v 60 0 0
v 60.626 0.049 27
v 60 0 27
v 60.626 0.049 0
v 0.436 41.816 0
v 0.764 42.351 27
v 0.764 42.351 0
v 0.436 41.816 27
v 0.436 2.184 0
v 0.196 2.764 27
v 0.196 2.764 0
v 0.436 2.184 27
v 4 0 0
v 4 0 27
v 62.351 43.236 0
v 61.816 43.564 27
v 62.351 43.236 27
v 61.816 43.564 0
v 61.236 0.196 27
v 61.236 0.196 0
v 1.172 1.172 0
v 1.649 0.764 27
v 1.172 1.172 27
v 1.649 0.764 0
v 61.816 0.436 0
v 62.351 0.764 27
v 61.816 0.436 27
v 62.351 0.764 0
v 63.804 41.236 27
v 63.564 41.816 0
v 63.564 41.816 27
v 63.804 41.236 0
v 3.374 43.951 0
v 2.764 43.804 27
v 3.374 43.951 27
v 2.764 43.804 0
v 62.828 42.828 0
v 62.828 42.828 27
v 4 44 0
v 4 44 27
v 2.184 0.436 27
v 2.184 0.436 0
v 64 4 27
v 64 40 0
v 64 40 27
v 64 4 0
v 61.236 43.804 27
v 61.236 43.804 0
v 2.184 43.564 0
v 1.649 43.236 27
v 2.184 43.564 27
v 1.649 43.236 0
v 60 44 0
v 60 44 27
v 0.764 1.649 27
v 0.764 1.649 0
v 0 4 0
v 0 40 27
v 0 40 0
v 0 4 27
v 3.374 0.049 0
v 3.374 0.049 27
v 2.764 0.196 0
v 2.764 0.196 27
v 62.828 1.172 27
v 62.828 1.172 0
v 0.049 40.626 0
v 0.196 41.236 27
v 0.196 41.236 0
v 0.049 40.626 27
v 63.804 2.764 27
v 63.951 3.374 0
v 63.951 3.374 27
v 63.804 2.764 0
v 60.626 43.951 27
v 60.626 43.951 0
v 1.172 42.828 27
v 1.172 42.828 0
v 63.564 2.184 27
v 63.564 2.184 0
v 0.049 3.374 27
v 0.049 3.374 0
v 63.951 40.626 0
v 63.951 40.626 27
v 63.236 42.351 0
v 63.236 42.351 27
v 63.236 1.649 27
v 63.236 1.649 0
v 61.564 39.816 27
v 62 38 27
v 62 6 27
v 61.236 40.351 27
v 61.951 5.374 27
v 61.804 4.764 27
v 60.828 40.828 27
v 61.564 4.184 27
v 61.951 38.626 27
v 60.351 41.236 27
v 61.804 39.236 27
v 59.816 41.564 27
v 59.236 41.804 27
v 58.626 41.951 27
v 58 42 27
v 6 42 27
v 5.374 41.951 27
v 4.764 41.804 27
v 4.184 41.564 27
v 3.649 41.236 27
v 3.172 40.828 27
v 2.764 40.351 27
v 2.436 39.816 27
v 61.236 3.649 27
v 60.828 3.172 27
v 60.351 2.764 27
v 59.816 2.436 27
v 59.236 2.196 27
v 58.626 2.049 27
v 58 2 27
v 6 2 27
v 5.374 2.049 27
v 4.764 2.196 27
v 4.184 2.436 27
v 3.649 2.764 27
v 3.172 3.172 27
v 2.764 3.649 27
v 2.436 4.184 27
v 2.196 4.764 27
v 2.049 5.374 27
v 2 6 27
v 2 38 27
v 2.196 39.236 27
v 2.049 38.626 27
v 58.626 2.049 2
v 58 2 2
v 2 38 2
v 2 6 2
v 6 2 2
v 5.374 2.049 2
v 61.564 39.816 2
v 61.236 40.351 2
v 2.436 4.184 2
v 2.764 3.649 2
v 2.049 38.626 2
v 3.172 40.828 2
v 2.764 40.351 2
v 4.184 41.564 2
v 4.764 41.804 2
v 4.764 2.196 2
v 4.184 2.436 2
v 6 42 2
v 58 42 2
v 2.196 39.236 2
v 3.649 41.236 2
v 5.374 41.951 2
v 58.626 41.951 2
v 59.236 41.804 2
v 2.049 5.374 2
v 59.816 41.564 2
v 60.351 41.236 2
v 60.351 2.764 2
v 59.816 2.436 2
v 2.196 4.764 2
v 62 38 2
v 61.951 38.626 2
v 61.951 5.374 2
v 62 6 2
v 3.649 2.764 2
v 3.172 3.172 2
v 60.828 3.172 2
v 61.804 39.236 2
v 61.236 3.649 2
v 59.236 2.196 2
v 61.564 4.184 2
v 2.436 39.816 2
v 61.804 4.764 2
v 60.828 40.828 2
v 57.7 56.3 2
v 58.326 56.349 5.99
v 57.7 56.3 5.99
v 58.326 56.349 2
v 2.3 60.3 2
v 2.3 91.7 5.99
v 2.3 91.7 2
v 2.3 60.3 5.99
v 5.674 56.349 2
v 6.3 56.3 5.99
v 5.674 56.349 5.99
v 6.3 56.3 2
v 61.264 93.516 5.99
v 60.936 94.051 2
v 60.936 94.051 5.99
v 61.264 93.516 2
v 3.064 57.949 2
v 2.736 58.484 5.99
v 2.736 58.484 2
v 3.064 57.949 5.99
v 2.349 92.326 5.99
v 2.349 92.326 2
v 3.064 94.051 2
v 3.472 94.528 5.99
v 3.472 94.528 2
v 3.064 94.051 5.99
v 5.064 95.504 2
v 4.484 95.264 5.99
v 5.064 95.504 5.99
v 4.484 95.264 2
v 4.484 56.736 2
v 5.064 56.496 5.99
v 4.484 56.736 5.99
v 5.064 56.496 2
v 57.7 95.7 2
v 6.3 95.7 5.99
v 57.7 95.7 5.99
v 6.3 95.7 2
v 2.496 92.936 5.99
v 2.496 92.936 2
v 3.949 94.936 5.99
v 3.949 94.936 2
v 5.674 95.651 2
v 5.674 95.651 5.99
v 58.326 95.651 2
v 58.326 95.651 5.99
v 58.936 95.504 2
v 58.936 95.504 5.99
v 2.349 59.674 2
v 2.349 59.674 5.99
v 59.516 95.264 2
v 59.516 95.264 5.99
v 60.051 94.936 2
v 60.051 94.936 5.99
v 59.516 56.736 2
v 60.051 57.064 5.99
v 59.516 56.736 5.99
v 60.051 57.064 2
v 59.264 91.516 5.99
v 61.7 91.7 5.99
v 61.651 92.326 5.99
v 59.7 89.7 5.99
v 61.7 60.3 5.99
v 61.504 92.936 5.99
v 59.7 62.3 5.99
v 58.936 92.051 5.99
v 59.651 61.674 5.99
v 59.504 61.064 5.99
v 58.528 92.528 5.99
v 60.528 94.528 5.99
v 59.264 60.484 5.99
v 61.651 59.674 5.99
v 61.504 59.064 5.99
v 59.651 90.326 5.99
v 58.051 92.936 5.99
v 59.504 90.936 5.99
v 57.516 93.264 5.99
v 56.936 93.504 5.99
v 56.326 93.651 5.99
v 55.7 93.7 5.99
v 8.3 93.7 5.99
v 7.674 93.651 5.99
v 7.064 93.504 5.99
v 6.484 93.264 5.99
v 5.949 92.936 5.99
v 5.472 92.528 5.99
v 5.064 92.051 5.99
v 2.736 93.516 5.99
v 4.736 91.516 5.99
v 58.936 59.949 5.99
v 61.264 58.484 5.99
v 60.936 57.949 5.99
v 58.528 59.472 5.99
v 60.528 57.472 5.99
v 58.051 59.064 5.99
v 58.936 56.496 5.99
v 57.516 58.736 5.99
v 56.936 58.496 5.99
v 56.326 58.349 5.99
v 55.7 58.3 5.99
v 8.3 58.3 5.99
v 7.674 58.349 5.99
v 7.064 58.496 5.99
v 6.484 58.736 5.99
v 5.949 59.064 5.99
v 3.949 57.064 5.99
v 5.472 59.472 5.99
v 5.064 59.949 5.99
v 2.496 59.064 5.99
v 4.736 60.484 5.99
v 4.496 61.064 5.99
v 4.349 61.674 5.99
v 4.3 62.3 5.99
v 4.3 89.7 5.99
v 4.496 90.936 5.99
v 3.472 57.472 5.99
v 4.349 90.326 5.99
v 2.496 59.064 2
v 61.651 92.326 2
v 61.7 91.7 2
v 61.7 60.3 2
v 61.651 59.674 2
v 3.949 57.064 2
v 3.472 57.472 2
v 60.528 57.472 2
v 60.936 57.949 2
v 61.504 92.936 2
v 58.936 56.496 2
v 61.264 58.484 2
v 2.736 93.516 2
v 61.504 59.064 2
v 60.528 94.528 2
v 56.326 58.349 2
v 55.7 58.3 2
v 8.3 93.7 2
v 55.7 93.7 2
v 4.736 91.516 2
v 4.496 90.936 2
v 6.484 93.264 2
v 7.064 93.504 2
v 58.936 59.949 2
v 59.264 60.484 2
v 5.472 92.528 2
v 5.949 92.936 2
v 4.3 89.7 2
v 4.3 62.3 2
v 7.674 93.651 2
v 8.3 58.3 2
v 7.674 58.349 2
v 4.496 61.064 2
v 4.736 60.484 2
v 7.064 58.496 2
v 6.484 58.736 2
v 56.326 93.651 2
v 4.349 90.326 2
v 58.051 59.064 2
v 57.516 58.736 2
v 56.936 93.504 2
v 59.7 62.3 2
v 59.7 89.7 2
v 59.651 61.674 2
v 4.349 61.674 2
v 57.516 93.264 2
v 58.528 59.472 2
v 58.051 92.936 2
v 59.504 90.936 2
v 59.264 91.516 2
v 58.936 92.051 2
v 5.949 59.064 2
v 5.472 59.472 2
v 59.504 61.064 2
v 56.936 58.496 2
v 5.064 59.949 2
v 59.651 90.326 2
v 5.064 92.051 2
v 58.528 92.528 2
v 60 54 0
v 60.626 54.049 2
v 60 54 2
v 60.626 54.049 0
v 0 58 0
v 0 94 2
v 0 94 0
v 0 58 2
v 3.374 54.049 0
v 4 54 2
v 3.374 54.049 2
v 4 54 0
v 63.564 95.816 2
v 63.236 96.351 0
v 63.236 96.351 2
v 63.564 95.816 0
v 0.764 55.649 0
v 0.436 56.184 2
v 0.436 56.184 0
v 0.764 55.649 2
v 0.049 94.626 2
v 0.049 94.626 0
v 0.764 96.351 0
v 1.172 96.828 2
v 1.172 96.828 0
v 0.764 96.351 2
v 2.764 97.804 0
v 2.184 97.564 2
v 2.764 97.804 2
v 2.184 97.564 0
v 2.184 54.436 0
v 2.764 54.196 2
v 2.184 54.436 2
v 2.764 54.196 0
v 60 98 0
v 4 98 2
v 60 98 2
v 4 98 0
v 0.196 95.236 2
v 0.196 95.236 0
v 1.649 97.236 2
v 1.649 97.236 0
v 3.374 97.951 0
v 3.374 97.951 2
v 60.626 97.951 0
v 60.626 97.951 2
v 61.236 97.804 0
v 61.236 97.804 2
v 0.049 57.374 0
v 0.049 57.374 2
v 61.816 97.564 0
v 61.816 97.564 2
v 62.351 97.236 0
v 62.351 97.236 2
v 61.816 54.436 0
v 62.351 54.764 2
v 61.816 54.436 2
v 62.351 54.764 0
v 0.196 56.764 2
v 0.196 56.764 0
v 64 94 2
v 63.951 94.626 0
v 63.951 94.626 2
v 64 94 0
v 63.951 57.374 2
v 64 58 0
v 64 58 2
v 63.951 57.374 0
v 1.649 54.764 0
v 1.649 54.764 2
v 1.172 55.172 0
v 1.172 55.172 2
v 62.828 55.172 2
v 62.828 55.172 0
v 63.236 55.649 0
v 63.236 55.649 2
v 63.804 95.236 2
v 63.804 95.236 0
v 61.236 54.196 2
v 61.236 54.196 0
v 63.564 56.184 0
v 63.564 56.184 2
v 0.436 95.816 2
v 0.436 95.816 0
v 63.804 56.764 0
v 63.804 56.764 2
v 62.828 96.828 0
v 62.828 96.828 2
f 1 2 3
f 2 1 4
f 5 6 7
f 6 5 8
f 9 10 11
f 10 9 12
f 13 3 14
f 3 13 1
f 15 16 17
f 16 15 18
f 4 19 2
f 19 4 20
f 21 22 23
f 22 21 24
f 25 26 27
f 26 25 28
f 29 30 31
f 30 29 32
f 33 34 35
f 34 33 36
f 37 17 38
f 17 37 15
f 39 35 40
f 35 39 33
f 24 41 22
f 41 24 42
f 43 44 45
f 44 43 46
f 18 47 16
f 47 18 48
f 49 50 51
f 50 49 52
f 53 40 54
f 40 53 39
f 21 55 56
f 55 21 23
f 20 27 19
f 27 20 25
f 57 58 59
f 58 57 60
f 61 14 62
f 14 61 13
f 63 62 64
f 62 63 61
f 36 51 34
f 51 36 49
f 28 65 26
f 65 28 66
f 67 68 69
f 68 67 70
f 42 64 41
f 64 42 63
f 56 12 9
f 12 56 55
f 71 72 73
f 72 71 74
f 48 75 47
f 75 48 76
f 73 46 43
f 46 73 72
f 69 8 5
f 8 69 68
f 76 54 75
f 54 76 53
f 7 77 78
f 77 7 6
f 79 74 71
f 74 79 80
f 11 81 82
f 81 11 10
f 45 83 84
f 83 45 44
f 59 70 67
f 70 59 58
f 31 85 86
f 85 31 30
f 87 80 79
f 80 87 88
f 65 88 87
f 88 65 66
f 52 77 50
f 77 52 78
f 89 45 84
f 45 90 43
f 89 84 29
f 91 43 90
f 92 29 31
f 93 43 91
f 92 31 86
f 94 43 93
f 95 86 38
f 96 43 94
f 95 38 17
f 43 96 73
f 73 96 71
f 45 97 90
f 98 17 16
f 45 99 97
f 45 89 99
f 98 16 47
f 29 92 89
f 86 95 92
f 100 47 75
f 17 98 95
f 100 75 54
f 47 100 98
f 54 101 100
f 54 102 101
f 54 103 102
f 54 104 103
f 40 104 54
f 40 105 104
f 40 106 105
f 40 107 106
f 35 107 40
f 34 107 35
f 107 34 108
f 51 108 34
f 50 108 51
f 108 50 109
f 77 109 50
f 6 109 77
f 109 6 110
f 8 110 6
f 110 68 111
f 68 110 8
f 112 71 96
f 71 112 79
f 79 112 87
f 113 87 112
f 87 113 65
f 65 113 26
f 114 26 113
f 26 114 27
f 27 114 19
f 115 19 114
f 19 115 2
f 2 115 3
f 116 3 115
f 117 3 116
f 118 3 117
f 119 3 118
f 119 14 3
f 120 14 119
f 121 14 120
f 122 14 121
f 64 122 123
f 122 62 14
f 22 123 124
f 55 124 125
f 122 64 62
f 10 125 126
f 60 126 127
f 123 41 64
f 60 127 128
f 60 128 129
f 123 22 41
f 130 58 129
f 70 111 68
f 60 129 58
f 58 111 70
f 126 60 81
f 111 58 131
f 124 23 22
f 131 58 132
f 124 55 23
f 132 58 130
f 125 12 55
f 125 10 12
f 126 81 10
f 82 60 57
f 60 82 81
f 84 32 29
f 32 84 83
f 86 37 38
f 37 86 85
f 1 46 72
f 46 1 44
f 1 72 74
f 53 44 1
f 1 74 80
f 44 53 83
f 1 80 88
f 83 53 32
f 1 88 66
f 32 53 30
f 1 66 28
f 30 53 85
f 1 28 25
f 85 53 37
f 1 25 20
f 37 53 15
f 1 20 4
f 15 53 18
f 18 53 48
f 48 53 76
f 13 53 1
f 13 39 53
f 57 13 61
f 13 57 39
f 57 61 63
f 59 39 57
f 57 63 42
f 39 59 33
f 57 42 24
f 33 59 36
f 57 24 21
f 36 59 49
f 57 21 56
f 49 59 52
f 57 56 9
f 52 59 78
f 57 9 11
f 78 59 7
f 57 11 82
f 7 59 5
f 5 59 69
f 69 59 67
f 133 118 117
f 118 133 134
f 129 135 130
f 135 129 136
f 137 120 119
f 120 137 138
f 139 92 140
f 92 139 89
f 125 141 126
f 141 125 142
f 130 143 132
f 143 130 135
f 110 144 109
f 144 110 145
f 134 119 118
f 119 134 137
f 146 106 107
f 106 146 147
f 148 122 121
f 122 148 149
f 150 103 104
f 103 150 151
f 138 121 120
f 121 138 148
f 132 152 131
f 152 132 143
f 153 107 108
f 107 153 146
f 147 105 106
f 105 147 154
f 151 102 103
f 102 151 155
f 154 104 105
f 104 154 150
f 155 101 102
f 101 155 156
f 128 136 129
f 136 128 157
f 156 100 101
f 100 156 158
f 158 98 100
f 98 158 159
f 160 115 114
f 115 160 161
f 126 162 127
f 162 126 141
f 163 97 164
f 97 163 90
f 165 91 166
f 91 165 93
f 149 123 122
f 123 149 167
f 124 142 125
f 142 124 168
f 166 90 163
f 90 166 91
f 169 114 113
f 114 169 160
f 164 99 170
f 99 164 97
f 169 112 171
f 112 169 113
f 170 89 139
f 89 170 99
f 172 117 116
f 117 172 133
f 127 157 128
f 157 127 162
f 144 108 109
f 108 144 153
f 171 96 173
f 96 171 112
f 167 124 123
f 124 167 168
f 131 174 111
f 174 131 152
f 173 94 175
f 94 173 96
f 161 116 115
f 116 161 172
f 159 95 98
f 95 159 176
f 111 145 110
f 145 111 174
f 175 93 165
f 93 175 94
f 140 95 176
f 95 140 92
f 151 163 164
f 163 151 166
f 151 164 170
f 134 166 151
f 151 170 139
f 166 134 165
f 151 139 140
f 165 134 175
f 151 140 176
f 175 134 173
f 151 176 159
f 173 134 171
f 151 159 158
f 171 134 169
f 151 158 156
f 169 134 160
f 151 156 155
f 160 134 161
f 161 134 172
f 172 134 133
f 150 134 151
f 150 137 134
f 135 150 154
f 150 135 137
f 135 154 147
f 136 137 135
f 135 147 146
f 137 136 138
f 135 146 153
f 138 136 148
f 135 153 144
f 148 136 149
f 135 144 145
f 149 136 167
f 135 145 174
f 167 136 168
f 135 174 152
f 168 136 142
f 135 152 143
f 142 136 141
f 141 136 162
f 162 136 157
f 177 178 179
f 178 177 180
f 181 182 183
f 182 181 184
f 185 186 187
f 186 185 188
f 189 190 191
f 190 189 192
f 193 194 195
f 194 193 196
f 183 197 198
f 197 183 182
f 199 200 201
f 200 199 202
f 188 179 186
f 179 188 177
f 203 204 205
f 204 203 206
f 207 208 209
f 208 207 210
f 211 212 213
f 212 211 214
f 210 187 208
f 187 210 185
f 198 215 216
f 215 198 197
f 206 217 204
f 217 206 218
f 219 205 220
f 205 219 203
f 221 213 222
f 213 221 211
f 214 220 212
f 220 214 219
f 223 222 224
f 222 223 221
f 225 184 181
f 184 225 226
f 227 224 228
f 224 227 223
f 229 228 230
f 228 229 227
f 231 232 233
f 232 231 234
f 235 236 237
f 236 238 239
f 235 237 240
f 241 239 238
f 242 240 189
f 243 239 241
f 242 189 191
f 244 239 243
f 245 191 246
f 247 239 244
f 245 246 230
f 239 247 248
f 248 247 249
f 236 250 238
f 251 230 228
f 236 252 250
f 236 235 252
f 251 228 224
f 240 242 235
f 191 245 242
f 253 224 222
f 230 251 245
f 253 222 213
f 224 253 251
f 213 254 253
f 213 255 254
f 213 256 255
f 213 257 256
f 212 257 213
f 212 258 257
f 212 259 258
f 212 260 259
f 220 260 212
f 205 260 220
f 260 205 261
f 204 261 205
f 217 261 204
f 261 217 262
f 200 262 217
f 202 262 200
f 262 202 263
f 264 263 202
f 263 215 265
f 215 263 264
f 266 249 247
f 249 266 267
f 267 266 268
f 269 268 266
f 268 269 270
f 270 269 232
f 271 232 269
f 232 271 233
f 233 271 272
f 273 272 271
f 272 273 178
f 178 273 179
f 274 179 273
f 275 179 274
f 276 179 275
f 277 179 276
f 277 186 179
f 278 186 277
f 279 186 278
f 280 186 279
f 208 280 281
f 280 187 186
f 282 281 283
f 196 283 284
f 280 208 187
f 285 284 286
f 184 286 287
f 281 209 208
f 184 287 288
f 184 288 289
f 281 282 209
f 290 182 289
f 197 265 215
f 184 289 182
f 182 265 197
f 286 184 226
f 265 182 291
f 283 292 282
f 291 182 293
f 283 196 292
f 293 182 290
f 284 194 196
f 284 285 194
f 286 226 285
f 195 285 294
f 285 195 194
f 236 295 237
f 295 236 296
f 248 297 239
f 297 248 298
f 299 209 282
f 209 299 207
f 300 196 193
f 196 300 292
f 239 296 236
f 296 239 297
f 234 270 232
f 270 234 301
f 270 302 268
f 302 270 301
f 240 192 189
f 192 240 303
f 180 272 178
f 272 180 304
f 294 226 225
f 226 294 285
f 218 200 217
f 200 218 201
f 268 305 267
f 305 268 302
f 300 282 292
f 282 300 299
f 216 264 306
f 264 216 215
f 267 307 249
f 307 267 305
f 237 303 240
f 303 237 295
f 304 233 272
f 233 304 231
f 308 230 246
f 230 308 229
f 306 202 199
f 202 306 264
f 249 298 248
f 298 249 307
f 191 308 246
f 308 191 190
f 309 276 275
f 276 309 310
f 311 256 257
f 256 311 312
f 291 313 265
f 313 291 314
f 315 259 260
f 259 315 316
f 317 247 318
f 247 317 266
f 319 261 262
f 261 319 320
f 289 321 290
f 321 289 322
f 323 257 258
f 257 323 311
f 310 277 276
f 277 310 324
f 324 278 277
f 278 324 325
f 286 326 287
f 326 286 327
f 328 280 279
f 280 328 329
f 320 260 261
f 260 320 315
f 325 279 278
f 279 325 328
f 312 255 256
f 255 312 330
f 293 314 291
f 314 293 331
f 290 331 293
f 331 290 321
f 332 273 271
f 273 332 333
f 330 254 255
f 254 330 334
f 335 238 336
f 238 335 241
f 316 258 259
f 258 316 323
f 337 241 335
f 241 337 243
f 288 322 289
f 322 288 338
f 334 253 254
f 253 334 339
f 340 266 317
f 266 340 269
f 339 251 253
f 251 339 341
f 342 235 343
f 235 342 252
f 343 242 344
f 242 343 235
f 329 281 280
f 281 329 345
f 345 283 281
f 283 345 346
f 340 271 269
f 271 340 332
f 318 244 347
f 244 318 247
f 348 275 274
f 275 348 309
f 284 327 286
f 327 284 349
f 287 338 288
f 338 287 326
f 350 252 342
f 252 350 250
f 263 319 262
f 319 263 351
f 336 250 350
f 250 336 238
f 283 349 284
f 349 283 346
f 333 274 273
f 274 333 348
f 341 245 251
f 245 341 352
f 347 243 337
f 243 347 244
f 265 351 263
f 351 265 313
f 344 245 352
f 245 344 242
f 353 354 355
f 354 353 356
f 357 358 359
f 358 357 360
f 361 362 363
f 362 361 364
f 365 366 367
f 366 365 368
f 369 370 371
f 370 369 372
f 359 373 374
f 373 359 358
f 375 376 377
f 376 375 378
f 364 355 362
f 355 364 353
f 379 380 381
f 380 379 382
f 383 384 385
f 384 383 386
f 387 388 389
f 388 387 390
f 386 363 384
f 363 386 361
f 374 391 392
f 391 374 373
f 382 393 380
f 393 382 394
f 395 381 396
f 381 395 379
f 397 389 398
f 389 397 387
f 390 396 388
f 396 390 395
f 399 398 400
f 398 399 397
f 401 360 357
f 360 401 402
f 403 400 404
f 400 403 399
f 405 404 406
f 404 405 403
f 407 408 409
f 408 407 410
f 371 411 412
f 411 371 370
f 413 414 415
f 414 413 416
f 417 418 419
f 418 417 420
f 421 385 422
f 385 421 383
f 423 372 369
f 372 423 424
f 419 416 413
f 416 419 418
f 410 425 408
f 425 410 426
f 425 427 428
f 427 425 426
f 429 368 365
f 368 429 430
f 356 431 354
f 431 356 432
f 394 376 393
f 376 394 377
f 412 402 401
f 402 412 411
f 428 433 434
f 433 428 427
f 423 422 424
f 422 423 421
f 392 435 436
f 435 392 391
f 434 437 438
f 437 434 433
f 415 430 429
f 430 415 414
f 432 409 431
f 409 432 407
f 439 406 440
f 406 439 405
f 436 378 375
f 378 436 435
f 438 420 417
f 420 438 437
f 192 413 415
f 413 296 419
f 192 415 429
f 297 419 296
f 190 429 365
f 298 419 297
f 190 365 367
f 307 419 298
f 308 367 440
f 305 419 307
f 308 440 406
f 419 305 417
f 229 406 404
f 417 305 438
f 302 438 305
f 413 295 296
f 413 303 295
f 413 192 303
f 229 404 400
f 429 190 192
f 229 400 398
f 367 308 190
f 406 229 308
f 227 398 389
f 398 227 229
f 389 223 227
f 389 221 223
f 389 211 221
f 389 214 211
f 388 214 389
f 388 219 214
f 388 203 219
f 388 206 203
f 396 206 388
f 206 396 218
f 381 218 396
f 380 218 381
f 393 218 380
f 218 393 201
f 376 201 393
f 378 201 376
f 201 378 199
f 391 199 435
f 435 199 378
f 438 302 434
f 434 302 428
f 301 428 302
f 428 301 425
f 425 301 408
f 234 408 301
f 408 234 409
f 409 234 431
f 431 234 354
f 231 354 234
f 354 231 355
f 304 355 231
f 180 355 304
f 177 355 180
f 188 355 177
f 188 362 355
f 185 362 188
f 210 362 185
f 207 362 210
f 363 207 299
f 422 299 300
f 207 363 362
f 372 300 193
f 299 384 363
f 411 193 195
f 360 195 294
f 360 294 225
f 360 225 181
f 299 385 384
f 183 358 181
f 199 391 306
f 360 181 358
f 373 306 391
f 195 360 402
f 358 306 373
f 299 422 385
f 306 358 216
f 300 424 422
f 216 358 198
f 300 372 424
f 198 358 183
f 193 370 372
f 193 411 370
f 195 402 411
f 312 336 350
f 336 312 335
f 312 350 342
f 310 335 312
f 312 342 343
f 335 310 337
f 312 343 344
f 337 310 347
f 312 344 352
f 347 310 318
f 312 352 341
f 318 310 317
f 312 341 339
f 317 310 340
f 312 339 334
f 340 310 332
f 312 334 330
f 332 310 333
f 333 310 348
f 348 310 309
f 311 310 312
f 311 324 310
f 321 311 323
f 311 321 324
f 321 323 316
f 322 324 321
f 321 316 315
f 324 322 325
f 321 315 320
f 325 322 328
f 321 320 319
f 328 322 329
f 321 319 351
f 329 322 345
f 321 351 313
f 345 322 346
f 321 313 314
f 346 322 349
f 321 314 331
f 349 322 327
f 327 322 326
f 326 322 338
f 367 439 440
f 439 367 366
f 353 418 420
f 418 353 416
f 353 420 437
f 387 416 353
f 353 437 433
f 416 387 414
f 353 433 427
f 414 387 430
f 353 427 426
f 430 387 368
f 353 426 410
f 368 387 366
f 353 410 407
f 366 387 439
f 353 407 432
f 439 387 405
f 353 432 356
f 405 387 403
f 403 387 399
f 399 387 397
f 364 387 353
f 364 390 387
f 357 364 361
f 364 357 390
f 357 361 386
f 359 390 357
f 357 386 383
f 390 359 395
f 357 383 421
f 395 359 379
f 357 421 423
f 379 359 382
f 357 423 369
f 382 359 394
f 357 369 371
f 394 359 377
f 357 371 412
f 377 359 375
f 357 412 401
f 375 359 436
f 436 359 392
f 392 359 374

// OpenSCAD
// Parametric box with lid, showing customizer groups, dropdowns and sliders.

/* [Size] */
// Inner width (mm)
inner_width = 60; // [20:1:200]
// Inner depth (mm)
inner_depth = 40; // [20:1:200]
// Inner height (mm)
inner_height = 25; // [10:1:150]

/* [Style] */
// Wall thickness (mm)
wall = 2; // [1.2:0.4:5]
// Corner style
corners = "round"; // [round:Rounded, sharp:Sharp]
// Corner radius when rounded (mm)
radius = 4; // [1:10]
// Which parts to show
part = "both"; // [both:Box and lid, box:Box only, lid:Lid only]

/* [Hidden] */
$fn = 40;
eps = 0.01;
gap = 0.3;

module rounded_rect(size, r) {
  if (corners == "round")
    offset(r = r) offset(delta = -r) square(size);
  else
    square(size);
}

module shell(w, d, h) {
  linear_extrude(h) rounded_rect([w, d], radius);
}

module box() {
  w = inner_width + 2 * wall;
  d = inner_depth + 2 * wall;
  difference() {
    shell(w, d, inner_height + wall);
    translate([wall, wall, wall]) shell(inner_width, inner_depth, inner_height + eps);
  }
}

module lid() {
  w = inner_width + 2 * wall;
  d = inner_depth + 2 * wall;
  translate([0, d + 10, 0]) {
    shell(w, d, wall);
    translate([wall + gap, wall + gap, wall - eps])
      difference() {
        shell(inner_width - 2 * gap, inner_depth - 2 * gap, 4);
        translate([wall, wall, -eps]) shell(inner_width - 2 * gap - 2 * wall, inner_depth - 2 * gap - 2 * wall, 4 + 2 * eps);
      }
  }
}

if (part != "lid") box();
if (part != "box") color("SteelBlue") lid();
